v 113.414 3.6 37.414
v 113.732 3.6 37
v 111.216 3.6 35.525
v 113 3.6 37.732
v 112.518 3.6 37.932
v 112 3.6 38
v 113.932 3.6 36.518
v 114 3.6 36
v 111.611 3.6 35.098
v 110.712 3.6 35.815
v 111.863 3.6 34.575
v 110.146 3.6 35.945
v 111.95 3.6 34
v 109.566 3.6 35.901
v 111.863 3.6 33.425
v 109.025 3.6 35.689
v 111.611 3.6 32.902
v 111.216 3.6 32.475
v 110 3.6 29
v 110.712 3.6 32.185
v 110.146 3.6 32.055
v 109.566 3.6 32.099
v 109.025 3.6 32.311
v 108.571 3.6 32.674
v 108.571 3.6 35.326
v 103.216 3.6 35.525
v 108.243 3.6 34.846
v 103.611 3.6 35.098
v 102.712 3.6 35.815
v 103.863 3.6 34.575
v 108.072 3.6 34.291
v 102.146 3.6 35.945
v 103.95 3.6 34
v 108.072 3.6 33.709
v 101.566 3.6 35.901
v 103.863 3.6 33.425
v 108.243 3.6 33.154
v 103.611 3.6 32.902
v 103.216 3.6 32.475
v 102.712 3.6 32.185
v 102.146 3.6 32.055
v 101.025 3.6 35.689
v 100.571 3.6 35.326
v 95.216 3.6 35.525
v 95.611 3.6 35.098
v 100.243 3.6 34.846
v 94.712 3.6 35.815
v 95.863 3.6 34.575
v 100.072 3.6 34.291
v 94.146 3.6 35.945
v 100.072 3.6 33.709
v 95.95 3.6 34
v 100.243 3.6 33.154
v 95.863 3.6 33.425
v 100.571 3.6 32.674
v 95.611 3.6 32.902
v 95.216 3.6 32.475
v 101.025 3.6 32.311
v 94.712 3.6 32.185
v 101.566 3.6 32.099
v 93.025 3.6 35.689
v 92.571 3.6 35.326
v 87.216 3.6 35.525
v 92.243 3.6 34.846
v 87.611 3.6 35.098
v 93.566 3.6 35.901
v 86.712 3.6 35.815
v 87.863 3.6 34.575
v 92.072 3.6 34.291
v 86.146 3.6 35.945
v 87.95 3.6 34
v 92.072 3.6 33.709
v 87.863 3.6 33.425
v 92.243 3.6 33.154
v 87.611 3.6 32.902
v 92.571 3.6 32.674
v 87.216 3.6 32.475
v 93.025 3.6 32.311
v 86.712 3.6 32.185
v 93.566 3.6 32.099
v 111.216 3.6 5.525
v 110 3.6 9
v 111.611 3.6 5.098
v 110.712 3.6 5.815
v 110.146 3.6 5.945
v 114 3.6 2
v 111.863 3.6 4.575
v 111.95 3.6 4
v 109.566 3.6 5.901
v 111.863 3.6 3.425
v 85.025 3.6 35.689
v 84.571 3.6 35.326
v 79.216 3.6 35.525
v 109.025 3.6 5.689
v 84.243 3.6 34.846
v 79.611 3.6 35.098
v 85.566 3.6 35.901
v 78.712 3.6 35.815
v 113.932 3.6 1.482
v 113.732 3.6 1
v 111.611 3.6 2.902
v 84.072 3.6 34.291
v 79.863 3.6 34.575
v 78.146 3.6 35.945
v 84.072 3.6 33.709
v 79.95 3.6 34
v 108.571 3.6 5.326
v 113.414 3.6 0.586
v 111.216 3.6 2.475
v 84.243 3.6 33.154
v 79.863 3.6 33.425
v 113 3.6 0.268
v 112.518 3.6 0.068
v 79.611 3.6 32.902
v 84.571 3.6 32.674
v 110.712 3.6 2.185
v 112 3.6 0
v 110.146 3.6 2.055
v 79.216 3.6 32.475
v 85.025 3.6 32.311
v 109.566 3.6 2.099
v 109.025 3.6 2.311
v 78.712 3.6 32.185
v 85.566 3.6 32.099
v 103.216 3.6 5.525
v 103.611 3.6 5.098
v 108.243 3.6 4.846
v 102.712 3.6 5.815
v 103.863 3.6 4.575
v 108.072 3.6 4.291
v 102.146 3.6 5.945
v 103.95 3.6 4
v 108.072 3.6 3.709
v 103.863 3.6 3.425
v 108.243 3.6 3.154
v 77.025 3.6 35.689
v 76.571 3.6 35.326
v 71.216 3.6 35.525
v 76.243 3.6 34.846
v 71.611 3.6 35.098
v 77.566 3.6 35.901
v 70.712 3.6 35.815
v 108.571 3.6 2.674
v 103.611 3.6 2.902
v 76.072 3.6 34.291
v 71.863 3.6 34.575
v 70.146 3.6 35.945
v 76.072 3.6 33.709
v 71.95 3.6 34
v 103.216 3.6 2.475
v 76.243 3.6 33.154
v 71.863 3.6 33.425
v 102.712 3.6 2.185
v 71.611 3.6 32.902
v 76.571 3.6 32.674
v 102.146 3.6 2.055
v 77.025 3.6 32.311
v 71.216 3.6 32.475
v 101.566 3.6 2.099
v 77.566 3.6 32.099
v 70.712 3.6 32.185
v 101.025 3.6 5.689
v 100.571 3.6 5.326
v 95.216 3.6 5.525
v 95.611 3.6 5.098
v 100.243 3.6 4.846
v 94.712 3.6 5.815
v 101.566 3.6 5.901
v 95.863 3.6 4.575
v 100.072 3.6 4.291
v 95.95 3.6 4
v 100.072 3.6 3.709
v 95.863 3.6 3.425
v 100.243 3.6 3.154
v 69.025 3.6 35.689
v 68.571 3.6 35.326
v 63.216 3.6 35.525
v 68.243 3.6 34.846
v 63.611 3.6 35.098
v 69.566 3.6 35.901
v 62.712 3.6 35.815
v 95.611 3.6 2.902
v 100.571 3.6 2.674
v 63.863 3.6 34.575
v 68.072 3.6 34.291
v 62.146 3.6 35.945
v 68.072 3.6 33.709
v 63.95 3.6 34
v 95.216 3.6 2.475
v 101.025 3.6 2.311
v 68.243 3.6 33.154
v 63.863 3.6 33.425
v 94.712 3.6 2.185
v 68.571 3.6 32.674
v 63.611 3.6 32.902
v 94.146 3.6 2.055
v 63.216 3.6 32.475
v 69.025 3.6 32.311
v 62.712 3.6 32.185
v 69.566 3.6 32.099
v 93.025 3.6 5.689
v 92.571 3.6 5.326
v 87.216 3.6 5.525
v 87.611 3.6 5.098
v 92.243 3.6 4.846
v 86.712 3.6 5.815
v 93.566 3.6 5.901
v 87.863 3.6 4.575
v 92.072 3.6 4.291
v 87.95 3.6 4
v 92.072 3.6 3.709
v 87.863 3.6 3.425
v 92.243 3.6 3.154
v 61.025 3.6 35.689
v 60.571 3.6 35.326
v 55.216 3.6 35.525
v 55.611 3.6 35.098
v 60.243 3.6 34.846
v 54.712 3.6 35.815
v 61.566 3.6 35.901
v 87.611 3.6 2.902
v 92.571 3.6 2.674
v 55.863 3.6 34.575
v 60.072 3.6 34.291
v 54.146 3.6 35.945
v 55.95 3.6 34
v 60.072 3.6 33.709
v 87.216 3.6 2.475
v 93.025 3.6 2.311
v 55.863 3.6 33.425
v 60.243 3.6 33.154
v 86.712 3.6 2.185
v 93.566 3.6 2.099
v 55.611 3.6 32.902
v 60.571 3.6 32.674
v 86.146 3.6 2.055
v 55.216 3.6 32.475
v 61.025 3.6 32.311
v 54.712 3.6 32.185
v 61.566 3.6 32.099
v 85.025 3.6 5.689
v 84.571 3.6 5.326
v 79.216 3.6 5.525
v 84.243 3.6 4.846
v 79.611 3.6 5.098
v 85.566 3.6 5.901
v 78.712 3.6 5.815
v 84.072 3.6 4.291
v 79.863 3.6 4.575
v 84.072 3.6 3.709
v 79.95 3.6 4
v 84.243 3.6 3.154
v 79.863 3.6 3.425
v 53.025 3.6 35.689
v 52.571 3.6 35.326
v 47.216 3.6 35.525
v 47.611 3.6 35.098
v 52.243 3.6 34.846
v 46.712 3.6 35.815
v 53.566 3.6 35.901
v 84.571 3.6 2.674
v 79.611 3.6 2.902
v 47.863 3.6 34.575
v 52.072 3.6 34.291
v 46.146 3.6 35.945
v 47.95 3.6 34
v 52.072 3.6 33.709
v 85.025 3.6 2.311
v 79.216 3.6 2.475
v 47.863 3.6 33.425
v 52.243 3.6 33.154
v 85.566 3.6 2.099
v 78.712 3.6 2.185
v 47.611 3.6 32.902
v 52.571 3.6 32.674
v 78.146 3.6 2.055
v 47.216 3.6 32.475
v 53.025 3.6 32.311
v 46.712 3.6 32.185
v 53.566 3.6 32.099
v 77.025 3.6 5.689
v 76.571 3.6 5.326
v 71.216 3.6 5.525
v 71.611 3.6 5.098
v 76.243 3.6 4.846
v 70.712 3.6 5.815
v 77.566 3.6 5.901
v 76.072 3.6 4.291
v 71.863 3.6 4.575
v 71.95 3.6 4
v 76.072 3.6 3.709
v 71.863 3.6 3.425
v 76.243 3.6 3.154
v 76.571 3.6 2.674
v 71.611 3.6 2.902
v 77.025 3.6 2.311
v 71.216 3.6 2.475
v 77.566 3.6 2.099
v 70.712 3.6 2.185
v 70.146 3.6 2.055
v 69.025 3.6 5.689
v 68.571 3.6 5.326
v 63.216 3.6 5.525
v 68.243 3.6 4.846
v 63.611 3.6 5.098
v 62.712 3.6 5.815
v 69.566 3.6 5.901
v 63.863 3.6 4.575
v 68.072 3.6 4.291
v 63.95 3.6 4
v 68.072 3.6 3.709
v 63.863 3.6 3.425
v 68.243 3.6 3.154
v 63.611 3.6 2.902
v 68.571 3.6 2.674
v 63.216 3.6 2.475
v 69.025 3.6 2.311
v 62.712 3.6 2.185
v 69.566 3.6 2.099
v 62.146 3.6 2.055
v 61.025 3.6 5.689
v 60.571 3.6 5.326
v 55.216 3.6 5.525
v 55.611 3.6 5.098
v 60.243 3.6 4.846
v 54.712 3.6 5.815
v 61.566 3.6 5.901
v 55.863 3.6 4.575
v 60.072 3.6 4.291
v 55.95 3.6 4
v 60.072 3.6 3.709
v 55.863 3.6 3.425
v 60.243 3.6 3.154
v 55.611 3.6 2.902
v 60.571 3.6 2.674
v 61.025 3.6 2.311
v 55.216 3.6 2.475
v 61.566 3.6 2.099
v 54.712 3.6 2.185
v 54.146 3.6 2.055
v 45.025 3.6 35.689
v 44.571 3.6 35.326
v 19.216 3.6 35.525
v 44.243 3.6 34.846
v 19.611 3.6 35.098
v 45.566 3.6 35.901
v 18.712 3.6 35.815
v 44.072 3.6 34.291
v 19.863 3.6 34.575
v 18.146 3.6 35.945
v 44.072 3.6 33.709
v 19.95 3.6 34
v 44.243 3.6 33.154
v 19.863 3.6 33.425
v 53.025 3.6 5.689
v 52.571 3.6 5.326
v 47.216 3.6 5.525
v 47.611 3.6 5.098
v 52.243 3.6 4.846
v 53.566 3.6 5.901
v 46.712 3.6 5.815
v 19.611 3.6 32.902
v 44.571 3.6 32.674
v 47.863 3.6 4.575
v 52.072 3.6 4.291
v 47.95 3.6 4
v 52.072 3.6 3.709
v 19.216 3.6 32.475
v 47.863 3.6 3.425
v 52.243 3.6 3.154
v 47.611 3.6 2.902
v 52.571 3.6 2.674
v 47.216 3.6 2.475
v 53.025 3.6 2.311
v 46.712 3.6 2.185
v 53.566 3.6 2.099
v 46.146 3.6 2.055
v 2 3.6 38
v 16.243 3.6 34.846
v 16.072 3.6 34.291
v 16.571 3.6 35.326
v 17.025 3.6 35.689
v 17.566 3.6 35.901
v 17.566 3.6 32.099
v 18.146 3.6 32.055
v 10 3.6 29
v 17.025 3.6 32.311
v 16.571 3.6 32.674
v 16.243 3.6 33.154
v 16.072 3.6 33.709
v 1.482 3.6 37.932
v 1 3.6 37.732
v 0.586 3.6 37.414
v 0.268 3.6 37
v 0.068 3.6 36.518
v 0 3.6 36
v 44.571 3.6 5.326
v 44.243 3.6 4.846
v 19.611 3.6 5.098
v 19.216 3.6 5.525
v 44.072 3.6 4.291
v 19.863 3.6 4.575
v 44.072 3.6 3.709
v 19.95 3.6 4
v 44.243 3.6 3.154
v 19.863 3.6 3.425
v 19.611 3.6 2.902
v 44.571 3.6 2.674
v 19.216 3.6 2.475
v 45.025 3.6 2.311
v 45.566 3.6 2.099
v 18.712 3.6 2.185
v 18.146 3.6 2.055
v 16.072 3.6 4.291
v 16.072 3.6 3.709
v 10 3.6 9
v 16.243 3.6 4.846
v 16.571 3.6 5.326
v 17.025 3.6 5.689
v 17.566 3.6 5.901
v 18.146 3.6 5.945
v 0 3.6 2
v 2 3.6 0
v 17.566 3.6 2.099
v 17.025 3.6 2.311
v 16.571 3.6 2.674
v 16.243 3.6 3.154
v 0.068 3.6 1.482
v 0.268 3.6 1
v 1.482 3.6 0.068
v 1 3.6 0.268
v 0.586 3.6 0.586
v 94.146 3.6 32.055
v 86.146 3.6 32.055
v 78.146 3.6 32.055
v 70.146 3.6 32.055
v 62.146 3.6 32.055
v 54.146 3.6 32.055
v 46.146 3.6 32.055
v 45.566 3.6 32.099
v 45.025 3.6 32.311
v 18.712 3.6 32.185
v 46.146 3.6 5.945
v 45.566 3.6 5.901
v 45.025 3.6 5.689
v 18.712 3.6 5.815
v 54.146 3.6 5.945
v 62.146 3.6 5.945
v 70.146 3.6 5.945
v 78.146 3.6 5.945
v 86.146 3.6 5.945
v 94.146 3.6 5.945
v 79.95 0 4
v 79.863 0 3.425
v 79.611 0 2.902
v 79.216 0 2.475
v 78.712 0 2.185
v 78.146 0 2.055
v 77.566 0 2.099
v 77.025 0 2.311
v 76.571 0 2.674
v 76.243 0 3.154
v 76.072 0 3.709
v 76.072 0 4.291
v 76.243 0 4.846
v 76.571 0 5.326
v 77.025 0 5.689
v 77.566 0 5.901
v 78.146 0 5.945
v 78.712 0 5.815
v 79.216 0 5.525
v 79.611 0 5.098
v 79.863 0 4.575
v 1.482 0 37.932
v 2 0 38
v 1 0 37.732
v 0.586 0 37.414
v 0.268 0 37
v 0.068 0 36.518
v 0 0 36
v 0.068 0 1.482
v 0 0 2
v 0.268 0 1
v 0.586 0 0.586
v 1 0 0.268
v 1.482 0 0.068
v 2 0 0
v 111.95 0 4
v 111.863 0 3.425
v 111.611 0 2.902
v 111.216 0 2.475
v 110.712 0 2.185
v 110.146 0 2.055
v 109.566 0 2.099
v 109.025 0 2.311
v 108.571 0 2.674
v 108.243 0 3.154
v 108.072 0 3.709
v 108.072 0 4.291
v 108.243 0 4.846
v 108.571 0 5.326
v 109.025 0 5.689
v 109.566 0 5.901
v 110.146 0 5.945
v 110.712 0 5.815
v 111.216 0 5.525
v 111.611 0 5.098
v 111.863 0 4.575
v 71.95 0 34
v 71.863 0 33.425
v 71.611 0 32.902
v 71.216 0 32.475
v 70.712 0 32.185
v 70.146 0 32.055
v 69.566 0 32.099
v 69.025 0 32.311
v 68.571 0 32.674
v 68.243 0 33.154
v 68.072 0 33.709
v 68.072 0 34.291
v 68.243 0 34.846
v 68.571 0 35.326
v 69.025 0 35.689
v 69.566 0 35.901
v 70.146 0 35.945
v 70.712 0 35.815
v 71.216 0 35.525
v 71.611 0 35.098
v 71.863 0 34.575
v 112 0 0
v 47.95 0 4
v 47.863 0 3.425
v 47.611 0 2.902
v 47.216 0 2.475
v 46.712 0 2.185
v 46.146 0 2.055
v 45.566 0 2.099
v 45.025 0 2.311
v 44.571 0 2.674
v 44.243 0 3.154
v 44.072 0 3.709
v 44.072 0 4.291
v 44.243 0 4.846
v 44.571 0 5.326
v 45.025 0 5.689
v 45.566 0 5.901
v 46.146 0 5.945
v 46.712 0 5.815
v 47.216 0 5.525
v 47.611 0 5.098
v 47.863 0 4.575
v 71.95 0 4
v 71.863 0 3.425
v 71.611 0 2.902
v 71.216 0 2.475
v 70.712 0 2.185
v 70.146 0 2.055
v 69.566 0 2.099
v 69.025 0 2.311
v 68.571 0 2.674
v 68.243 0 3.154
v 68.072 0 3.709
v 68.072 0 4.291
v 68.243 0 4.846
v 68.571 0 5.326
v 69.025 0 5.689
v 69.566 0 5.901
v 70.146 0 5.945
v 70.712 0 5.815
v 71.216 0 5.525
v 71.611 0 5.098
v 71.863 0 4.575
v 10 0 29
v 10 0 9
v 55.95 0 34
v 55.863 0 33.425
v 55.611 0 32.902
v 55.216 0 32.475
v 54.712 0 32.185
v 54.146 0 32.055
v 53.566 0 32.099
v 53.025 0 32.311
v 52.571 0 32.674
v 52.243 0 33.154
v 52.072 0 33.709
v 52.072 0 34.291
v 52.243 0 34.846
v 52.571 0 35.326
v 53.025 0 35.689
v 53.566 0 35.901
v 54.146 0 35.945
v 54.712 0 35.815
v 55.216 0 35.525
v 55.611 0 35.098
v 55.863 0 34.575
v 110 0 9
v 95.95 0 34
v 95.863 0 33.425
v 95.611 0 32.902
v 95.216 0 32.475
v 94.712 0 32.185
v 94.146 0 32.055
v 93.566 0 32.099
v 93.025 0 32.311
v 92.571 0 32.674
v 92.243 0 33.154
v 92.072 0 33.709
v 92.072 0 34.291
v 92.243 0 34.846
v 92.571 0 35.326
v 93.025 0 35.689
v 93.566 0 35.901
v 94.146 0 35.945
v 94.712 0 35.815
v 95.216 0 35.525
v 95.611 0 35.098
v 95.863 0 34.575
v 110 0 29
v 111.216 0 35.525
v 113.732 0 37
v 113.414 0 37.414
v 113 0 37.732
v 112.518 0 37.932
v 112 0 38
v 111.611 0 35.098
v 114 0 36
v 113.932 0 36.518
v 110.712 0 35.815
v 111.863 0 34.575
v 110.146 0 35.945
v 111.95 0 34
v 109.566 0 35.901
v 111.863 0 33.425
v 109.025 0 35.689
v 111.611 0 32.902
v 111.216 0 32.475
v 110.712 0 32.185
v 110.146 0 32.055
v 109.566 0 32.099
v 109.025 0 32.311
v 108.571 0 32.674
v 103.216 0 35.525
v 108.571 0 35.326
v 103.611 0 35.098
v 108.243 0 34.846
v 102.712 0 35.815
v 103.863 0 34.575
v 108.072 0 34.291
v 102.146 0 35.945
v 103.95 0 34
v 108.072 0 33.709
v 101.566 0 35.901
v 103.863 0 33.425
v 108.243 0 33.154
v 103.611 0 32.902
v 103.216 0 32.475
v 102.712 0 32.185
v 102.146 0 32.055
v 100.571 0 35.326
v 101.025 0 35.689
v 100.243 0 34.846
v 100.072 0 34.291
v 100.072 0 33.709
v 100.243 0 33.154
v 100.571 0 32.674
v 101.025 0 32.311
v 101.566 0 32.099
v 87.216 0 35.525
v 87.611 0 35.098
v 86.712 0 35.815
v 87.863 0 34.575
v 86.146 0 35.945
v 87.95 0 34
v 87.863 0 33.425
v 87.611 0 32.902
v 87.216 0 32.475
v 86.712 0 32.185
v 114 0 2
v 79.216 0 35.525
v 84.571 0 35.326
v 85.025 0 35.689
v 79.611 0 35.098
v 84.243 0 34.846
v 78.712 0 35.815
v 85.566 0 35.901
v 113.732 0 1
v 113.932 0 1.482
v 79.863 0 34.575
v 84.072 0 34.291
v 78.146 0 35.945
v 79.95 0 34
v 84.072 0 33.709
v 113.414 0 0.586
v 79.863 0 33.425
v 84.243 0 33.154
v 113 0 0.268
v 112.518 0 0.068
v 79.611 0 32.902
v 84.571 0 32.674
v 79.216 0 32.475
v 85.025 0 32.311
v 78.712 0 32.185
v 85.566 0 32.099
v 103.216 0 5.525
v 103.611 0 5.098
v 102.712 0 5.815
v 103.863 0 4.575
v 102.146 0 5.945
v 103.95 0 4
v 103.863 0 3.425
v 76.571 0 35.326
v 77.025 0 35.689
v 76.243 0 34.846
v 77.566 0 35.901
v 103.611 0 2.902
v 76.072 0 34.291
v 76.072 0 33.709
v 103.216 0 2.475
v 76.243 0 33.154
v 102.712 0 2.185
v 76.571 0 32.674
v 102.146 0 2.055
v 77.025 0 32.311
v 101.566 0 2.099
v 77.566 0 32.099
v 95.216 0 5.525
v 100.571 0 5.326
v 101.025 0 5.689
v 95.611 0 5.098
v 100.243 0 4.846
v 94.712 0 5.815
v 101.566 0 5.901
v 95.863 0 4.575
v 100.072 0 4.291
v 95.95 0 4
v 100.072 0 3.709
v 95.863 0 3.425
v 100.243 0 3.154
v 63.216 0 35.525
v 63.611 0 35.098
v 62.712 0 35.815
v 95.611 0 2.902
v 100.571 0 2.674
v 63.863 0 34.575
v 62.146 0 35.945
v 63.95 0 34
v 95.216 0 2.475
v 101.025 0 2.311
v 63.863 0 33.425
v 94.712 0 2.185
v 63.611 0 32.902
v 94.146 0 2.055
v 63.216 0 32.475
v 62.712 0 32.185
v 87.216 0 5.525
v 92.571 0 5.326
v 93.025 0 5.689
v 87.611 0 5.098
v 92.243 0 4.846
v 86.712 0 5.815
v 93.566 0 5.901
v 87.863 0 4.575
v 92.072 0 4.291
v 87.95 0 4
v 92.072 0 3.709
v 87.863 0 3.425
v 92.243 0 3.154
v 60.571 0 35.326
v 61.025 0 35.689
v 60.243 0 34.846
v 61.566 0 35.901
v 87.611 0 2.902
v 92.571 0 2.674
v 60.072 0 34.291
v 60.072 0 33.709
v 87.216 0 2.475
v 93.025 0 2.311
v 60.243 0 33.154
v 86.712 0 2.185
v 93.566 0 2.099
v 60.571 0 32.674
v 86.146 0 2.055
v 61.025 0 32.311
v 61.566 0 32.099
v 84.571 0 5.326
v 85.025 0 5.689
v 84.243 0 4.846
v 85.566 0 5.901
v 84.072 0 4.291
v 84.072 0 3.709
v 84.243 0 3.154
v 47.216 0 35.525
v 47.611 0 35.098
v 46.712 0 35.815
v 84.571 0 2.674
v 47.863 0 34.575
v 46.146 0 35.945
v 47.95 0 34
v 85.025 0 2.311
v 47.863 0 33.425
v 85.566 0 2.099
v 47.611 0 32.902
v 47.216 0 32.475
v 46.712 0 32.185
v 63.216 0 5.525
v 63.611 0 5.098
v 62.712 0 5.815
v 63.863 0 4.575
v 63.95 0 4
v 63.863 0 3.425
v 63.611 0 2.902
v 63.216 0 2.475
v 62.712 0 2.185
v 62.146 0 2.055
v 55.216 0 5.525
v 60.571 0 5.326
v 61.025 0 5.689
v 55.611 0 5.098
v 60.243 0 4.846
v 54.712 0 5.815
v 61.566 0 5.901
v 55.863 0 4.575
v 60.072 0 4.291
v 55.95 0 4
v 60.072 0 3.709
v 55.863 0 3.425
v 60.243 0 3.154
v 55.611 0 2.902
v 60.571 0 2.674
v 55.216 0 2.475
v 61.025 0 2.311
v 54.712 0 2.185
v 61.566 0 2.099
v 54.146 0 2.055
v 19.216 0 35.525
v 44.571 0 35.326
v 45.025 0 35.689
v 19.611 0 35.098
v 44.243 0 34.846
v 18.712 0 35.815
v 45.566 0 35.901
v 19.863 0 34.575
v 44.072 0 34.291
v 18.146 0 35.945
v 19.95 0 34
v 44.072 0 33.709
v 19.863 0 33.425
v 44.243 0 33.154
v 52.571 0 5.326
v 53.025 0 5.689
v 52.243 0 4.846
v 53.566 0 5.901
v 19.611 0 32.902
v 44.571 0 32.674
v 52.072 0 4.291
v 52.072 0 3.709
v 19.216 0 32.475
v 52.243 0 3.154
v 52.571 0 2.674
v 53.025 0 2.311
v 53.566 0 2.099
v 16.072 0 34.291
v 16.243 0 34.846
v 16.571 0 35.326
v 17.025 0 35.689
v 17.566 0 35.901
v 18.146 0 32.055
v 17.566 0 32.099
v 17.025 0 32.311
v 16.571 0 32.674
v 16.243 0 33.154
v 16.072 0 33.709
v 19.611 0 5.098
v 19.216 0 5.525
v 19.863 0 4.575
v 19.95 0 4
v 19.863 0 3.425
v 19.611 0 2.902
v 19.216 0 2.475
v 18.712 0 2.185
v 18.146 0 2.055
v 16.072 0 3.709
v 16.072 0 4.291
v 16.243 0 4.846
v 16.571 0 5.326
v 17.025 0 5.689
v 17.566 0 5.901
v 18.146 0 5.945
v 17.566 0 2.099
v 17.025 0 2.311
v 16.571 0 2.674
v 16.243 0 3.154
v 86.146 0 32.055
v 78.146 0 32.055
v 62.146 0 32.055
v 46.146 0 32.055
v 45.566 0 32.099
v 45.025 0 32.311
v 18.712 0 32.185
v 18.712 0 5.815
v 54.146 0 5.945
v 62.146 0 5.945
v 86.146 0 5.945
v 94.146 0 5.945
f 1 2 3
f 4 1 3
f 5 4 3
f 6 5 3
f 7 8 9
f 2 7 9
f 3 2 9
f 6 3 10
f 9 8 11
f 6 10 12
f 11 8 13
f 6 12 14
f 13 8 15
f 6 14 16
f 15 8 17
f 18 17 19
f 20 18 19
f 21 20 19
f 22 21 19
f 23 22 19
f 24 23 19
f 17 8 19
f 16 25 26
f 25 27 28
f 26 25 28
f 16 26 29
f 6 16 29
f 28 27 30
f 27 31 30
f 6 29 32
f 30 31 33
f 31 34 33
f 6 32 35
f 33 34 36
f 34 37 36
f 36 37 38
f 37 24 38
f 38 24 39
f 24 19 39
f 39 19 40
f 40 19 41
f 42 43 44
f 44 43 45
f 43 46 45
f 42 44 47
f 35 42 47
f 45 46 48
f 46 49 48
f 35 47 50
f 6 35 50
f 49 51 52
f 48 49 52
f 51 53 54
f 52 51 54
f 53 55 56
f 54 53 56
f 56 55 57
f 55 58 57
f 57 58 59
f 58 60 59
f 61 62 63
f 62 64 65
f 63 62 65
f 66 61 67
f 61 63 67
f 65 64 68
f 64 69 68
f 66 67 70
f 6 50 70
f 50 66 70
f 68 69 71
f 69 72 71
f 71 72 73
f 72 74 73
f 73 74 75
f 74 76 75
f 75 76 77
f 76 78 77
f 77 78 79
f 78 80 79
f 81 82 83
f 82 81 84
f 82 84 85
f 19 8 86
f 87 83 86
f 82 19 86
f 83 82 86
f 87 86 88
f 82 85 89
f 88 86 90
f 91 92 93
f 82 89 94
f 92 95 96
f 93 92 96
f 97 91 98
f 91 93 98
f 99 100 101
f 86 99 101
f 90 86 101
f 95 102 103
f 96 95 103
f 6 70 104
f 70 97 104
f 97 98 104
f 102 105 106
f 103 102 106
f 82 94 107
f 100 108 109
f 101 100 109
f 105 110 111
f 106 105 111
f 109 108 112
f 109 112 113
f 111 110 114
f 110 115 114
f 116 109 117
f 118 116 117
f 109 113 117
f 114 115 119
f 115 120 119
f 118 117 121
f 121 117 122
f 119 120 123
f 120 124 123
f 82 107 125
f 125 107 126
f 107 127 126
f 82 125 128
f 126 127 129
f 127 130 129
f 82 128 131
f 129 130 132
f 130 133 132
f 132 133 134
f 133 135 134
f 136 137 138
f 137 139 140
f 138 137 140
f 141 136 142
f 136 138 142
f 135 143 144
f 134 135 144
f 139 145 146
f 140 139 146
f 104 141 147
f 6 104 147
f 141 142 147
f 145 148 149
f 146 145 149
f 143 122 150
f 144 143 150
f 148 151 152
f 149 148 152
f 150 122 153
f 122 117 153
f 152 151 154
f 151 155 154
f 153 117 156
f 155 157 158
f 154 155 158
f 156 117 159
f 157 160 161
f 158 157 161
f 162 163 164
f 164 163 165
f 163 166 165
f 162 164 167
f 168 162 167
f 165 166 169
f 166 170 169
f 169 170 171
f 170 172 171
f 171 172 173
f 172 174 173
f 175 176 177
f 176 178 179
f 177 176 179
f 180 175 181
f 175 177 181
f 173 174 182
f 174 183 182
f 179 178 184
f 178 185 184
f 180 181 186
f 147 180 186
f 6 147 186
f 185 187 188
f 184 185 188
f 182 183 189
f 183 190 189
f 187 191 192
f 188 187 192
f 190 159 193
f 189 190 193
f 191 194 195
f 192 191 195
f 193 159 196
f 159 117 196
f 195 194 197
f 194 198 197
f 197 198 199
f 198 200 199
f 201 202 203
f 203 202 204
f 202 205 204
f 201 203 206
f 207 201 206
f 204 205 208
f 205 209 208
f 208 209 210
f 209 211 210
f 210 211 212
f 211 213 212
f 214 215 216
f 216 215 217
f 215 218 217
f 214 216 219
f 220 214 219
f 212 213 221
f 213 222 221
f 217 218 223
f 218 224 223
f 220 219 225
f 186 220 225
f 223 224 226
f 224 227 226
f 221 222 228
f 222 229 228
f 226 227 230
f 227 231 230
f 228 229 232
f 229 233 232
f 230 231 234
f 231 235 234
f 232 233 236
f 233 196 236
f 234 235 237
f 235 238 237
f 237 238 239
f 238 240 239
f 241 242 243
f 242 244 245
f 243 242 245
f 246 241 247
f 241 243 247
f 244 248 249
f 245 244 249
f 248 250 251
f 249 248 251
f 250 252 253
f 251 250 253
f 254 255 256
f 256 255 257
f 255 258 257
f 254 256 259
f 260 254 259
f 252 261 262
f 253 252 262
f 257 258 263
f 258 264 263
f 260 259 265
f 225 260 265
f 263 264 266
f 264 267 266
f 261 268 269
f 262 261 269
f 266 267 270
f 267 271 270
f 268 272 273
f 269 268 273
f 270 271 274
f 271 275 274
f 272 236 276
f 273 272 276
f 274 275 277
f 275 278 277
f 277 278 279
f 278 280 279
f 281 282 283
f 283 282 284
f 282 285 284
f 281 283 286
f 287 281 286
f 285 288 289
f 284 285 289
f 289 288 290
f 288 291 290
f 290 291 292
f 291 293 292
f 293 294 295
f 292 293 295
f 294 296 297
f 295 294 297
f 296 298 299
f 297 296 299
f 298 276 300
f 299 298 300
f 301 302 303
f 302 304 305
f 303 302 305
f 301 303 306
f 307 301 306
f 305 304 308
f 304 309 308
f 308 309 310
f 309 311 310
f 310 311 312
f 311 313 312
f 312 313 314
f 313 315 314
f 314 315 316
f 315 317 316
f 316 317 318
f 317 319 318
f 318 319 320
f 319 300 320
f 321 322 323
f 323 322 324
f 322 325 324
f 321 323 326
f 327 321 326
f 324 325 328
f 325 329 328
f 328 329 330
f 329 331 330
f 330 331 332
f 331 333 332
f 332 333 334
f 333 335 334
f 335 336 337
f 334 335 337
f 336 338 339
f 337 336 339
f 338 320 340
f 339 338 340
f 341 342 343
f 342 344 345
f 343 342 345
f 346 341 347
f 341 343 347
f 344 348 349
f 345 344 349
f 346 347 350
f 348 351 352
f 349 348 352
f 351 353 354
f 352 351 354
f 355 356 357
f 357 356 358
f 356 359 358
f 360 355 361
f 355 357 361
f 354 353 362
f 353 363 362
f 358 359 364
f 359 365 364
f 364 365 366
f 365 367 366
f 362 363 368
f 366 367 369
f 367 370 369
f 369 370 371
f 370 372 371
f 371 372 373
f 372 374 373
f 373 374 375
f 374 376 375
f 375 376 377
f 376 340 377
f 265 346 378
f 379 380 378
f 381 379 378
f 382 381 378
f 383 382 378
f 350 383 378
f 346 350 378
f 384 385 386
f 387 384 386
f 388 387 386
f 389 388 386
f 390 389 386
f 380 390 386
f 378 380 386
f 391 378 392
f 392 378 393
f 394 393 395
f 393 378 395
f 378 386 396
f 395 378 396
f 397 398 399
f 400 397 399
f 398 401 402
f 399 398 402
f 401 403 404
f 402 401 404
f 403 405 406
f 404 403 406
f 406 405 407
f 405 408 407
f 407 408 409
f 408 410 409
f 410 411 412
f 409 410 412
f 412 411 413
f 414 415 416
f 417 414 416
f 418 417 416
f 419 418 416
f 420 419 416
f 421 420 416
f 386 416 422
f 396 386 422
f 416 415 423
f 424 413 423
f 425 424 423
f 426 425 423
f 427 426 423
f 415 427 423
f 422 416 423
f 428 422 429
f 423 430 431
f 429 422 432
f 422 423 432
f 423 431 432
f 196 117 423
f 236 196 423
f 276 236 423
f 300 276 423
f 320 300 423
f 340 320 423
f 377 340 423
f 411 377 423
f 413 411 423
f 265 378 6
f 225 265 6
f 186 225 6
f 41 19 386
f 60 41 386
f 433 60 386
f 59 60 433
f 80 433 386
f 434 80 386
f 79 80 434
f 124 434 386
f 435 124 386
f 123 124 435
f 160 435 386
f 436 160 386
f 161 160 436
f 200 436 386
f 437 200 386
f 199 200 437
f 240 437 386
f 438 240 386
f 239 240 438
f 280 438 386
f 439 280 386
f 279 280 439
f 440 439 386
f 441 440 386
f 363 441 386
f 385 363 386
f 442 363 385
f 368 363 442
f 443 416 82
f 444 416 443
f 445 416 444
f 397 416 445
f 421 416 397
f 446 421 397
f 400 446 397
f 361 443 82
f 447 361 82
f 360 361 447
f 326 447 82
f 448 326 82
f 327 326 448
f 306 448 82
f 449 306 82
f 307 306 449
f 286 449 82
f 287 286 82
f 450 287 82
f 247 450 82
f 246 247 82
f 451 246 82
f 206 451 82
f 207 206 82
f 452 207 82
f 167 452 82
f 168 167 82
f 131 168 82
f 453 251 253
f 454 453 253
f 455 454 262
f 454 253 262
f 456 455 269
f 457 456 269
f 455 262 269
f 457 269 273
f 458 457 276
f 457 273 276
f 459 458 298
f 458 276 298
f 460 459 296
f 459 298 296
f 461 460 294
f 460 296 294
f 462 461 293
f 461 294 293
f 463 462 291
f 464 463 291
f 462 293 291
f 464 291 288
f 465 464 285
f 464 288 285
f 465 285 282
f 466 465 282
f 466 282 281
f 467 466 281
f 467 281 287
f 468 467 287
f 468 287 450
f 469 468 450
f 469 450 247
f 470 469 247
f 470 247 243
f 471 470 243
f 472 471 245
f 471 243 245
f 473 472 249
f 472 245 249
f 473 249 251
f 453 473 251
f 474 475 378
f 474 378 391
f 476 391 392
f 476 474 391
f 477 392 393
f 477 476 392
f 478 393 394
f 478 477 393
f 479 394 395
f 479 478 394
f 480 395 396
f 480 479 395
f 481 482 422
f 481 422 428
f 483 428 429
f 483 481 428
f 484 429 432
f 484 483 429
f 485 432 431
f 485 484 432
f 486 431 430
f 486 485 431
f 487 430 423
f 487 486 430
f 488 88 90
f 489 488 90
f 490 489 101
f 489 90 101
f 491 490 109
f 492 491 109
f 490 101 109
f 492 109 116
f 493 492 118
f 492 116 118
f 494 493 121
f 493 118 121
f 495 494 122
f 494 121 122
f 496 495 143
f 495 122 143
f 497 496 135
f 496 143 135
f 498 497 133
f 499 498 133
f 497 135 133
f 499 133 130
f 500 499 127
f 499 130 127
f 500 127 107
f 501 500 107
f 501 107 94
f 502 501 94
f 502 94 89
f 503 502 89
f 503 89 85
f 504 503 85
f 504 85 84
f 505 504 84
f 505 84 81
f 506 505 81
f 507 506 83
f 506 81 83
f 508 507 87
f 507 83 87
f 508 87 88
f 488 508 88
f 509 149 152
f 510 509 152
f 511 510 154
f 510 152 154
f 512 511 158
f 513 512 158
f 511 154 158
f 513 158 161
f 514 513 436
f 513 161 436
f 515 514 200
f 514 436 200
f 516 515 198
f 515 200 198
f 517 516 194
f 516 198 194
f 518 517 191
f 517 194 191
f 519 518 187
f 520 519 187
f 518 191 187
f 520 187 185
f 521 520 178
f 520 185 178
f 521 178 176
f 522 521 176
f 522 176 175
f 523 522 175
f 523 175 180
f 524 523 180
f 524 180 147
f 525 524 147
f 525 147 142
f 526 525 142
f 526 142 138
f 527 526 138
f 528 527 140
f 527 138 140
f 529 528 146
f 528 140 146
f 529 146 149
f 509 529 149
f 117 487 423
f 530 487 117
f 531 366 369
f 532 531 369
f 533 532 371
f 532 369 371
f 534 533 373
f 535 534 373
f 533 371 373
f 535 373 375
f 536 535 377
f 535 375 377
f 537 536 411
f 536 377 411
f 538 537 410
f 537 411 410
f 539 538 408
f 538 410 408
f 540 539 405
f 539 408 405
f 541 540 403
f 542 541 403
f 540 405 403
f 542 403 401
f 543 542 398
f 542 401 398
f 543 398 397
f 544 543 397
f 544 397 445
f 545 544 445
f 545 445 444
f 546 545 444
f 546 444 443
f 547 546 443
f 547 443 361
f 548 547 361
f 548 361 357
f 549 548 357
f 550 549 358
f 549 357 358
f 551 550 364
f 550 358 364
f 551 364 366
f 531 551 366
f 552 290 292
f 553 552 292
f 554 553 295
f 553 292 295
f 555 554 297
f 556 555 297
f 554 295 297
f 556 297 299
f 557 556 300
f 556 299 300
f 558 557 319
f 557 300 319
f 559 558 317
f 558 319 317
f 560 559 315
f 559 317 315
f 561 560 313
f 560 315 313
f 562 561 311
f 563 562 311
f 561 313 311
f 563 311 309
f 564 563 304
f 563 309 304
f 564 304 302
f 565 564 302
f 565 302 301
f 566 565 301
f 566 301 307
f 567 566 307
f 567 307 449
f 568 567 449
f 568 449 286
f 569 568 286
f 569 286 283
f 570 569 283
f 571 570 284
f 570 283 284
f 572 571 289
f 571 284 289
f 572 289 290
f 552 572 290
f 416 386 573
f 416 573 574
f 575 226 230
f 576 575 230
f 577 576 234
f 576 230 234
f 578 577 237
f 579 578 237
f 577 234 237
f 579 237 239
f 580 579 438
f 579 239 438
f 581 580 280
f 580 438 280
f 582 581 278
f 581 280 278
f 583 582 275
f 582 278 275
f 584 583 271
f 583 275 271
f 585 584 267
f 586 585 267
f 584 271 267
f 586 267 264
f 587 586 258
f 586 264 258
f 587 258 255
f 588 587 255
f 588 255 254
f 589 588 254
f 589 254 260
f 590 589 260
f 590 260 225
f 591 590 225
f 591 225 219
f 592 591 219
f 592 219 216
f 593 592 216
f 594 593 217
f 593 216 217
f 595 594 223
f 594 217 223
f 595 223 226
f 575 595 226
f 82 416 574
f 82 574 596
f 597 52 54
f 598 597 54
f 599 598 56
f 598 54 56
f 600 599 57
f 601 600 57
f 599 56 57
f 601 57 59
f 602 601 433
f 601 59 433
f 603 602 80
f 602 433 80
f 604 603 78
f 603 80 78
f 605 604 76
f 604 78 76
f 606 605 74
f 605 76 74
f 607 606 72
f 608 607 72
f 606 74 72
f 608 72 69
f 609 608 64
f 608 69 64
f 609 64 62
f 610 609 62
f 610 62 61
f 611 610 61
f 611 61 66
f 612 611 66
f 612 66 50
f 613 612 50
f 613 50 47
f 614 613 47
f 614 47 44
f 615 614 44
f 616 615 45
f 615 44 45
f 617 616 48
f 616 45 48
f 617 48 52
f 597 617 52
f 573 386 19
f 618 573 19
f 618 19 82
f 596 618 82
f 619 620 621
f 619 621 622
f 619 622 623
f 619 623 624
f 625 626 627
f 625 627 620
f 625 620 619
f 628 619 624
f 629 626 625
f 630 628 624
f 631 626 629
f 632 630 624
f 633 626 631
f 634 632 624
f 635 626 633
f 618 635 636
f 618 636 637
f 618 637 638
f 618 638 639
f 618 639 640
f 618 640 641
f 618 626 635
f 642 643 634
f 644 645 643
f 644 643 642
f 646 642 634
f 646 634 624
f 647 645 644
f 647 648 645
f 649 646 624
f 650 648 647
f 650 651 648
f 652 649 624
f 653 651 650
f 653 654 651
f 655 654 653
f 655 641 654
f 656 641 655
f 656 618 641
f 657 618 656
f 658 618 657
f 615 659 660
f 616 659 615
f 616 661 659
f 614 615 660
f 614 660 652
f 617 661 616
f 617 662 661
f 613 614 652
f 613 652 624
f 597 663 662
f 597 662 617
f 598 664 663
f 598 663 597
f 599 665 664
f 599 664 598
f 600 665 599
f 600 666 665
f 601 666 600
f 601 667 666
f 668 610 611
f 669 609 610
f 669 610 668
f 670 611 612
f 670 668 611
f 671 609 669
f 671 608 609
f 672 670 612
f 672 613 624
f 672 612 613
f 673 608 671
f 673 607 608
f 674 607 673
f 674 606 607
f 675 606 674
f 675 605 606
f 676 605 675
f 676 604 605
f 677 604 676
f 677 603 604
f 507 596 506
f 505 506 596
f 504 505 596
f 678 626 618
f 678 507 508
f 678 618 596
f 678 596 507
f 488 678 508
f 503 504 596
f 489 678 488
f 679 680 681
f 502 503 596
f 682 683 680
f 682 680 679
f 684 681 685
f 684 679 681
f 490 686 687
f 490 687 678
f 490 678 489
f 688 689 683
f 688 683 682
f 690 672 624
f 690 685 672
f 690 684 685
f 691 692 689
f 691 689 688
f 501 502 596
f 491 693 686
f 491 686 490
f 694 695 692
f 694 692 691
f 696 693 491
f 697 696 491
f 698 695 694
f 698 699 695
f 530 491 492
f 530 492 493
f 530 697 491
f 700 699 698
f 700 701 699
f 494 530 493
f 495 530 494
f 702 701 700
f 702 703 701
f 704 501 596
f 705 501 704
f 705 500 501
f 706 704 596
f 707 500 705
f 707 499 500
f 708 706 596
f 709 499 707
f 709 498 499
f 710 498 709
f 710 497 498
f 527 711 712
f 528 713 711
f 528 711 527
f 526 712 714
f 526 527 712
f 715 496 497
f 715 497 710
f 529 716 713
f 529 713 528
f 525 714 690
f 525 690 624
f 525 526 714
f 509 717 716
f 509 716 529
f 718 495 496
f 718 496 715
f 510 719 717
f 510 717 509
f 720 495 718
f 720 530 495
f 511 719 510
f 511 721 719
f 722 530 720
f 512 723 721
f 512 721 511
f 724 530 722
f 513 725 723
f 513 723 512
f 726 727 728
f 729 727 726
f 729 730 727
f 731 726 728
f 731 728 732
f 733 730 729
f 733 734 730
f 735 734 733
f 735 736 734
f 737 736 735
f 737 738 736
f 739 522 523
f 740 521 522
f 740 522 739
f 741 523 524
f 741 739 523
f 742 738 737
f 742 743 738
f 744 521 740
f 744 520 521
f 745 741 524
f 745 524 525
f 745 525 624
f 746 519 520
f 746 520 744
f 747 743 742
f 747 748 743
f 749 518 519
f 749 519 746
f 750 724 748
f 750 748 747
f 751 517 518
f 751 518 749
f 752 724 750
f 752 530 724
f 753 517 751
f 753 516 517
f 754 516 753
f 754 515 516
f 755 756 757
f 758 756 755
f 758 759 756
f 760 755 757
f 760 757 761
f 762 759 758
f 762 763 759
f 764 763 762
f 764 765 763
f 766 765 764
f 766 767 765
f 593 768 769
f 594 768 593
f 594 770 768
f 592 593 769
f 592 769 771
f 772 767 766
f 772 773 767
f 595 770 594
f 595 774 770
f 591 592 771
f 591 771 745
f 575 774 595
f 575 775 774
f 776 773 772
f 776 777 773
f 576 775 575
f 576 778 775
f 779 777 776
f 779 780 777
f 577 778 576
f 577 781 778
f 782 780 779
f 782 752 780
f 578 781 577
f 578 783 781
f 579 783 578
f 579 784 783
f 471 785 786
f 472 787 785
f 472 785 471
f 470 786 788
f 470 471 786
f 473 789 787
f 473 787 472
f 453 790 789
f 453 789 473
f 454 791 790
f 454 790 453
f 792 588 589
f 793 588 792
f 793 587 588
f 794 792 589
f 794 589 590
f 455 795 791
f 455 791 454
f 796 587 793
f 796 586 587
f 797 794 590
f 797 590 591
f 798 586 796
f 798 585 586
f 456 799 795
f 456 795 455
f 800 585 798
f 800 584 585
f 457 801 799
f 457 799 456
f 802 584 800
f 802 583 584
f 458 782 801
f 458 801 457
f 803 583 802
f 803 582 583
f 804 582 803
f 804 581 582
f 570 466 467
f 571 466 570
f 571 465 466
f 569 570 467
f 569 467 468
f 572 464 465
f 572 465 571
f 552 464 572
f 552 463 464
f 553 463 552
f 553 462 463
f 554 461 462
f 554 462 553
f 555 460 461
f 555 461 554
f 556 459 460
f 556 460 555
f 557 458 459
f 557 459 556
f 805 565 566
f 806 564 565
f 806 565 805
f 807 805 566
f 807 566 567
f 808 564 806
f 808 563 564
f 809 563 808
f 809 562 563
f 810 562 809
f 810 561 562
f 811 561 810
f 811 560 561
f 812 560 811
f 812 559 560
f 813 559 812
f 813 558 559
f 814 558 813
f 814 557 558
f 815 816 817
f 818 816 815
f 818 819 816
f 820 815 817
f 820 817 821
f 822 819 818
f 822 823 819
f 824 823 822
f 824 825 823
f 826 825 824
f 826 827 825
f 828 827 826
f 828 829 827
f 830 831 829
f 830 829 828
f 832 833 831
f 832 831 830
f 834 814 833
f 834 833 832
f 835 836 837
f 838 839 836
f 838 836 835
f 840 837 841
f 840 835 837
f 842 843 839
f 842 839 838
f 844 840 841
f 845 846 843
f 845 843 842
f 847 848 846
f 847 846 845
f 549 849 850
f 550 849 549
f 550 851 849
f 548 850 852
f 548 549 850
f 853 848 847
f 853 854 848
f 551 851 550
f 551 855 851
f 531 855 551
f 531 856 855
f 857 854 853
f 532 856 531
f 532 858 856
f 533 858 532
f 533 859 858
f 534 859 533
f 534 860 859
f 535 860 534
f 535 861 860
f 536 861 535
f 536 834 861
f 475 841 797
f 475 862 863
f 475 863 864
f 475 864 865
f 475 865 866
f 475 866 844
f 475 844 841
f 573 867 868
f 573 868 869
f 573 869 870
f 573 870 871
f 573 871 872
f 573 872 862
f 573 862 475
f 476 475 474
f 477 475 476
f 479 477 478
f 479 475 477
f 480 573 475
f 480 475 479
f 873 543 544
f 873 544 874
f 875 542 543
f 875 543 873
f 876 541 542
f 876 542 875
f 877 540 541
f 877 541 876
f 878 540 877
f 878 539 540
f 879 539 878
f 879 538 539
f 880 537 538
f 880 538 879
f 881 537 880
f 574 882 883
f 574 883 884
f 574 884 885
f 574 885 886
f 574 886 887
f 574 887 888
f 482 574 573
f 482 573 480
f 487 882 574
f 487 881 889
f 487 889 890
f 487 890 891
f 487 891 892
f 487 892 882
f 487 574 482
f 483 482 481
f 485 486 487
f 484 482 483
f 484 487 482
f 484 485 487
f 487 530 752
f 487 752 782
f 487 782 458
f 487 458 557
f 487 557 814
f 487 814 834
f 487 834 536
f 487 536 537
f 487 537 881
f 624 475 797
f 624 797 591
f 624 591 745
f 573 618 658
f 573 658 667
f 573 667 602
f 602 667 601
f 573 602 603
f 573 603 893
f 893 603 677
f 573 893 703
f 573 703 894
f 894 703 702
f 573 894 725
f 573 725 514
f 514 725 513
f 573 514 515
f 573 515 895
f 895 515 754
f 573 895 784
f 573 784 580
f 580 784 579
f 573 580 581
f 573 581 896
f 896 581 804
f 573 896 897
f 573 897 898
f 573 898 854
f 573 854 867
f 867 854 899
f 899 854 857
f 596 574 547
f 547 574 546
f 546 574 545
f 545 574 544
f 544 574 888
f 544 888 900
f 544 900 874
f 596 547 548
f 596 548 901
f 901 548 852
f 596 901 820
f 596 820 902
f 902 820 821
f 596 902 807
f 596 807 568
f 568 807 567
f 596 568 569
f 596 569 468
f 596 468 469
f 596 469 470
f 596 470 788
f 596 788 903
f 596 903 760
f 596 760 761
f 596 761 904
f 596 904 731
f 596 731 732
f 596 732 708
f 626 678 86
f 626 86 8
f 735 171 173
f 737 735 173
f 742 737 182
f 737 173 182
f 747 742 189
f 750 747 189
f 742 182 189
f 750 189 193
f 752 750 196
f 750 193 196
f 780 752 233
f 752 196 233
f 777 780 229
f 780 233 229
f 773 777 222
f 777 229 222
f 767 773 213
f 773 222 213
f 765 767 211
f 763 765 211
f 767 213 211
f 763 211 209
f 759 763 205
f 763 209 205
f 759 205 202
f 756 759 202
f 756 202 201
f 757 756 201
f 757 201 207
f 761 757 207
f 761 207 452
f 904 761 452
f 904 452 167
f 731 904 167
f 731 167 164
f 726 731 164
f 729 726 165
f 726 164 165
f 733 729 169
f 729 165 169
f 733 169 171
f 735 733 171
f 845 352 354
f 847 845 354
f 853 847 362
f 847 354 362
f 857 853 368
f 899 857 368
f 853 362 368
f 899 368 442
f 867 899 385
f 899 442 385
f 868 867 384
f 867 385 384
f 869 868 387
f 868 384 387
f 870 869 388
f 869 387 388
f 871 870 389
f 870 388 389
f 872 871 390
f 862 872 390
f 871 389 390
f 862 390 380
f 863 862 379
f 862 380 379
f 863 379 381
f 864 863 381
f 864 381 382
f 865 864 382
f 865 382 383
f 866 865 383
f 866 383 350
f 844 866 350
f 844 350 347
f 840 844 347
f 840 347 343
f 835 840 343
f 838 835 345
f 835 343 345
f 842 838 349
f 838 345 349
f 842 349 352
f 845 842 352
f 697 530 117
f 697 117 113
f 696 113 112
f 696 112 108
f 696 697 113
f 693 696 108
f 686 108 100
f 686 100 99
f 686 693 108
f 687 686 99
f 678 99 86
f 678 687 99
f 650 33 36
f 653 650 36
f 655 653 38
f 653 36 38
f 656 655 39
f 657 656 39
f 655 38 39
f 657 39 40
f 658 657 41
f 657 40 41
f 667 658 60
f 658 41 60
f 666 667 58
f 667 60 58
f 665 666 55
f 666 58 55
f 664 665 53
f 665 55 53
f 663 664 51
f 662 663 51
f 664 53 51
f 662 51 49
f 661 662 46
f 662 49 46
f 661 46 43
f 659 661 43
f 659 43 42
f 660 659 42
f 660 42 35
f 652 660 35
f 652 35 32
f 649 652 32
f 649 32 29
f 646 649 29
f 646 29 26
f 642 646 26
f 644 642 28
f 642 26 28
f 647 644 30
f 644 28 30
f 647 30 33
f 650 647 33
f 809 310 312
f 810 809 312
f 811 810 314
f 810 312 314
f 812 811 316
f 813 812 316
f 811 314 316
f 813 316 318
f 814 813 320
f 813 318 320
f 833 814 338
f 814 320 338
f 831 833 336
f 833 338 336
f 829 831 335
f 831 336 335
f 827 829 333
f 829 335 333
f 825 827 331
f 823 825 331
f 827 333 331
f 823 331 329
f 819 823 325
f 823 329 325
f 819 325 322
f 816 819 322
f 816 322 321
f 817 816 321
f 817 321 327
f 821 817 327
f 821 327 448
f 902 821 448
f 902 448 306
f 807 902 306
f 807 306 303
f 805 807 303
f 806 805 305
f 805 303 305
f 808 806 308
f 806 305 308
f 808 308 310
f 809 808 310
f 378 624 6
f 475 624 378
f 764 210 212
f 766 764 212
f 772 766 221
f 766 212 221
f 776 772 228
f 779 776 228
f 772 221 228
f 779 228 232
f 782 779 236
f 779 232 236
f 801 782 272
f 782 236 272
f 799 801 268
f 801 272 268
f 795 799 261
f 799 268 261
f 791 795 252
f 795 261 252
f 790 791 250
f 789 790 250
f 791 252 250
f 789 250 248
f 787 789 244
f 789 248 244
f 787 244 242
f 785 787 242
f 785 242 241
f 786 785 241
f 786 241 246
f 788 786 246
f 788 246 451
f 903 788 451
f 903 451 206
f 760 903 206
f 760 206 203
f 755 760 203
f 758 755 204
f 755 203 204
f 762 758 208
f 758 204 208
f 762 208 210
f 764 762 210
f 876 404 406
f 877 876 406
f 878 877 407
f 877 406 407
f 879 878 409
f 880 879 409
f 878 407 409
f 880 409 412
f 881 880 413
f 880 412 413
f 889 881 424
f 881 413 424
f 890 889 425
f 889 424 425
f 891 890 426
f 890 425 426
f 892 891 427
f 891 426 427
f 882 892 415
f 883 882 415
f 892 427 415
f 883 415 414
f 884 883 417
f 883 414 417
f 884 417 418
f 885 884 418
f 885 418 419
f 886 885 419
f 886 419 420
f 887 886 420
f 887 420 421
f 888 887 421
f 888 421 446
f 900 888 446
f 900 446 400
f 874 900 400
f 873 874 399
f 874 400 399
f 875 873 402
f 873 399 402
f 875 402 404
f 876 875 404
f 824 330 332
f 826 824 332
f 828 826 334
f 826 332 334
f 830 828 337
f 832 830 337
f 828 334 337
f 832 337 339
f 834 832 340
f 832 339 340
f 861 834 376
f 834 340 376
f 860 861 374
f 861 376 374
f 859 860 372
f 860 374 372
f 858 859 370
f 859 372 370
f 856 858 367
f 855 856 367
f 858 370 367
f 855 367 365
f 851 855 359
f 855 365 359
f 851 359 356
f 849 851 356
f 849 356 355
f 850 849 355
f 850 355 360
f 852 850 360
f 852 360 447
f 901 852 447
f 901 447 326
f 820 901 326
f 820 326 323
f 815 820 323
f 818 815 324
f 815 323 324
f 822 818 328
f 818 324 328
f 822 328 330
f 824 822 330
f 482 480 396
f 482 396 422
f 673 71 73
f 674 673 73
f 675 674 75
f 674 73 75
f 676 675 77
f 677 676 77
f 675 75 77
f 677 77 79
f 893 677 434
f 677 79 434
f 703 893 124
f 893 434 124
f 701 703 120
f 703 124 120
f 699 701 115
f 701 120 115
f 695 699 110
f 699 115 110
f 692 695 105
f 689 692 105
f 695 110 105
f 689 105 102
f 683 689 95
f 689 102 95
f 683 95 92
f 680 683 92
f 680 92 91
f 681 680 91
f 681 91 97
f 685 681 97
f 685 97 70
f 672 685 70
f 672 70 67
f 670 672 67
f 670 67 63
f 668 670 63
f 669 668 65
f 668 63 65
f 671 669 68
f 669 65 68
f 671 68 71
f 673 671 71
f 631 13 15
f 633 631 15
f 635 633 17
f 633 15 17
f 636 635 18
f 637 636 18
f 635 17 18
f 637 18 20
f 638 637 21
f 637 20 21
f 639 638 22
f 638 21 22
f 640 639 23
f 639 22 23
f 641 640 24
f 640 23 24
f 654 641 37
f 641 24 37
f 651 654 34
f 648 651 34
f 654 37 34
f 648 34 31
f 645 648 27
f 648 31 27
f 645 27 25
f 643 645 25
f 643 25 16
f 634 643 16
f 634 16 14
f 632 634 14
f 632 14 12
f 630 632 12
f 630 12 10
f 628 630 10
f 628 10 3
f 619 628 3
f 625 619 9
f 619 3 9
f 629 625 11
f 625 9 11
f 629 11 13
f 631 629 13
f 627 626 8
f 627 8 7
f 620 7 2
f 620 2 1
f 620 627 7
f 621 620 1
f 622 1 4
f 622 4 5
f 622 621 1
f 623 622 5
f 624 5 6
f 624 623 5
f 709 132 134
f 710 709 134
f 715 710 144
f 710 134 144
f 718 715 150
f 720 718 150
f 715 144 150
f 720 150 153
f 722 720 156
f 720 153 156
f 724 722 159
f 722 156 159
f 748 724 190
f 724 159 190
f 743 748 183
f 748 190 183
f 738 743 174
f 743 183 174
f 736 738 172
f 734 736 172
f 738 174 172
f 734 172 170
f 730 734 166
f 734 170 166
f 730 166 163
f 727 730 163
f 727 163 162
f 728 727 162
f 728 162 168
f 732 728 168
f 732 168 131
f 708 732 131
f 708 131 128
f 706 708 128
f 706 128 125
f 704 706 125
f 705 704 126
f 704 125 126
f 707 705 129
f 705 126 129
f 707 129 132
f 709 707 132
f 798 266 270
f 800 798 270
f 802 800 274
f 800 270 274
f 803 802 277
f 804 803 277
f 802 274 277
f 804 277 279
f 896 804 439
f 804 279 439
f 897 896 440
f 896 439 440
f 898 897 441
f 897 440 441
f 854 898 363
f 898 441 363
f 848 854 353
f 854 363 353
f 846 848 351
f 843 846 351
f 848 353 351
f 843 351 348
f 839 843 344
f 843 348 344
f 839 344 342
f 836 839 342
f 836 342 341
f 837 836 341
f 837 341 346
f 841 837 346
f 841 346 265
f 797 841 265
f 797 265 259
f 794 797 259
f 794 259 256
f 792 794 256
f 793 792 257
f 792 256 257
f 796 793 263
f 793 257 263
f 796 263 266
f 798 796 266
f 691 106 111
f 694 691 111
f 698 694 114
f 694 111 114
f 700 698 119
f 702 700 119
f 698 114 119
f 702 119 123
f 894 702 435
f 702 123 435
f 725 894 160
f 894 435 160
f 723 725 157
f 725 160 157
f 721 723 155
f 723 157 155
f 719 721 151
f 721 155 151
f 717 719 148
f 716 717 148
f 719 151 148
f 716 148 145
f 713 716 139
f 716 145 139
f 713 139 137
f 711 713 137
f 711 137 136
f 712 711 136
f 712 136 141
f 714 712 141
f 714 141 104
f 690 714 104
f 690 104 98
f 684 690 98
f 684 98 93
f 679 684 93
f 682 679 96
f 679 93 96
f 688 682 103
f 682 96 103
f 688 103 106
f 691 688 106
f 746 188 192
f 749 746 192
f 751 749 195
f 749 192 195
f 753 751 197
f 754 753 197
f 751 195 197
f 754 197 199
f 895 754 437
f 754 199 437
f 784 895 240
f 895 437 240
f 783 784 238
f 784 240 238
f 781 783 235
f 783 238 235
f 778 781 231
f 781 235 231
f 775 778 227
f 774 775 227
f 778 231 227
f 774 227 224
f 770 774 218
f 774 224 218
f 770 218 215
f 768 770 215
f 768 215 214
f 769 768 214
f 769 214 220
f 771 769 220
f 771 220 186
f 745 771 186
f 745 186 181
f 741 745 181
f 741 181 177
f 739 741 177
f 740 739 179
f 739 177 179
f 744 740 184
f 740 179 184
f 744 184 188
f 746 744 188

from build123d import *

# Parameters (mm, degrees)
BOSS_EXTRUDE1_DEPTH = 3.6
SKETCH2_R           = 1.95
SKETCH2_W           = 100
SKETCH2_H           = 20
CUT_EXTRUDE1_DEPTH  = 3.6


with BuildPart() as part:
    # Sketch1 → Boss-Extrude1 (new body)
    with BuildSketch(Plane(origin=(0, 0, 0), x_dir=(1, 0, 0), z_dir=(0, 1, 0))):
        with BuildLine():
            Line((2, 0), (112, 0))
            ThreePointArc((112, 0), (113.414213562, -0.585786438), (114, -2))
            Line((114, -2), (114, -36))
            ThreePointArc((114, -36), (113.414213562, -37.414213562), (112, -38))
            Line((112, -38), (2, -38))
            ThreePointArc((2, -38), (0.585786438, -37.414213562), (0, -36))
            Line((0, -36), (0, -2))
            ThreePointArc((0, -2), (0.585786438, -0.585786438), (2, 0))
        make_face()
    extrude(amount=BOSS_EXTRUDE1_DEPTH)

    # Sketch2 → Cut-Extrude1 (cut)
    with BuildSketch(Plane(origin=(0, 3.6, 0), x_dir=(1, 0, 0), z_dir=(0, 1, 0))):
        with Locations((110, -4)):
            Circle(SKETCH2_R)
        with Locations((102, -4)):
            Circle(SKETCH2_R)
        with Locations((18, -4)):
            Circle(SKETCH2_R)
        with Locations((46, -4)):
            Circle(SKETCH2_R)
        with Locations((54, -4)):
            Circle(SKETCH2_R)
        with Locations((62, -4)):
            Circle(SKETCH2_R)
        with Locations((70, -4)):
            Circle(SKETCH2_R)
        with Locations((78, -4)):
            Circle(SKETCH2_R)
        with Locations((86, -4)):
            Circle(SKETCH2_R)
        with Locations((94, -4)):
            Circle(SKETCH2_R)
        with Locations((110, -34)):
            Circle(SKETCH2_R)
        with Locations((102, -34)):
            Circle(SKETCH2_R)
        with Locations((18, -34)):
            Circle(SKETCH2_R)
        with Locations((46, -34)):
            Circle(SKETCH2_R)
        with Locations((54, -34)):
            Circle(SKETCH2_R)
        with Locations((62, -34)):
            Circle(SKETCH2_R)
        with Locations((70, -34)):
            Circle(SKETCH2_R)
        with Locations((78, -34)):
            Circle(SKETCH2_R)
        with Locations((86, -34)):
            Circle(SKETCH2_R)
        with Locations((94, -34)):
            Circle(SKETCH2_R)
        with Locations((60, -19)):
            Rectangle(SKETCH2_W, SKETCH2_H)
    extrude(amount=-CUT_EXTRUDE1_DEPTH, mode=Mode.SUBTRACT)


solid = part.part
